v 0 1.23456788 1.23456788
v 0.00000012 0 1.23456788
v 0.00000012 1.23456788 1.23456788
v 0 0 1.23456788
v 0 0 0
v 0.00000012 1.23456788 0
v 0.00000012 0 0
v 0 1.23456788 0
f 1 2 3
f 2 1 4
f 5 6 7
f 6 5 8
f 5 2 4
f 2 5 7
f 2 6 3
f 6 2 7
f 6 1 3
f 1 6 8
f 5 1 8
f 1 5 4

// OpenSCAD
doubleValueOfFloatEpsilon = 1.19208998e-07;

differentDoubleWithSameFloatCast1 = 1.23456788;
differentDoubleWithSameFloatCast2 = 1.23456789;

cube([
  doubleValueOfFloatEpsilon,
  // Check that we're only outputting floats, not doubles! (there should be no 1.23456789 in the output)
  differentDoubleWithSameFloatCast1,
  differentDoubleWithSameFloatCast2
]);
